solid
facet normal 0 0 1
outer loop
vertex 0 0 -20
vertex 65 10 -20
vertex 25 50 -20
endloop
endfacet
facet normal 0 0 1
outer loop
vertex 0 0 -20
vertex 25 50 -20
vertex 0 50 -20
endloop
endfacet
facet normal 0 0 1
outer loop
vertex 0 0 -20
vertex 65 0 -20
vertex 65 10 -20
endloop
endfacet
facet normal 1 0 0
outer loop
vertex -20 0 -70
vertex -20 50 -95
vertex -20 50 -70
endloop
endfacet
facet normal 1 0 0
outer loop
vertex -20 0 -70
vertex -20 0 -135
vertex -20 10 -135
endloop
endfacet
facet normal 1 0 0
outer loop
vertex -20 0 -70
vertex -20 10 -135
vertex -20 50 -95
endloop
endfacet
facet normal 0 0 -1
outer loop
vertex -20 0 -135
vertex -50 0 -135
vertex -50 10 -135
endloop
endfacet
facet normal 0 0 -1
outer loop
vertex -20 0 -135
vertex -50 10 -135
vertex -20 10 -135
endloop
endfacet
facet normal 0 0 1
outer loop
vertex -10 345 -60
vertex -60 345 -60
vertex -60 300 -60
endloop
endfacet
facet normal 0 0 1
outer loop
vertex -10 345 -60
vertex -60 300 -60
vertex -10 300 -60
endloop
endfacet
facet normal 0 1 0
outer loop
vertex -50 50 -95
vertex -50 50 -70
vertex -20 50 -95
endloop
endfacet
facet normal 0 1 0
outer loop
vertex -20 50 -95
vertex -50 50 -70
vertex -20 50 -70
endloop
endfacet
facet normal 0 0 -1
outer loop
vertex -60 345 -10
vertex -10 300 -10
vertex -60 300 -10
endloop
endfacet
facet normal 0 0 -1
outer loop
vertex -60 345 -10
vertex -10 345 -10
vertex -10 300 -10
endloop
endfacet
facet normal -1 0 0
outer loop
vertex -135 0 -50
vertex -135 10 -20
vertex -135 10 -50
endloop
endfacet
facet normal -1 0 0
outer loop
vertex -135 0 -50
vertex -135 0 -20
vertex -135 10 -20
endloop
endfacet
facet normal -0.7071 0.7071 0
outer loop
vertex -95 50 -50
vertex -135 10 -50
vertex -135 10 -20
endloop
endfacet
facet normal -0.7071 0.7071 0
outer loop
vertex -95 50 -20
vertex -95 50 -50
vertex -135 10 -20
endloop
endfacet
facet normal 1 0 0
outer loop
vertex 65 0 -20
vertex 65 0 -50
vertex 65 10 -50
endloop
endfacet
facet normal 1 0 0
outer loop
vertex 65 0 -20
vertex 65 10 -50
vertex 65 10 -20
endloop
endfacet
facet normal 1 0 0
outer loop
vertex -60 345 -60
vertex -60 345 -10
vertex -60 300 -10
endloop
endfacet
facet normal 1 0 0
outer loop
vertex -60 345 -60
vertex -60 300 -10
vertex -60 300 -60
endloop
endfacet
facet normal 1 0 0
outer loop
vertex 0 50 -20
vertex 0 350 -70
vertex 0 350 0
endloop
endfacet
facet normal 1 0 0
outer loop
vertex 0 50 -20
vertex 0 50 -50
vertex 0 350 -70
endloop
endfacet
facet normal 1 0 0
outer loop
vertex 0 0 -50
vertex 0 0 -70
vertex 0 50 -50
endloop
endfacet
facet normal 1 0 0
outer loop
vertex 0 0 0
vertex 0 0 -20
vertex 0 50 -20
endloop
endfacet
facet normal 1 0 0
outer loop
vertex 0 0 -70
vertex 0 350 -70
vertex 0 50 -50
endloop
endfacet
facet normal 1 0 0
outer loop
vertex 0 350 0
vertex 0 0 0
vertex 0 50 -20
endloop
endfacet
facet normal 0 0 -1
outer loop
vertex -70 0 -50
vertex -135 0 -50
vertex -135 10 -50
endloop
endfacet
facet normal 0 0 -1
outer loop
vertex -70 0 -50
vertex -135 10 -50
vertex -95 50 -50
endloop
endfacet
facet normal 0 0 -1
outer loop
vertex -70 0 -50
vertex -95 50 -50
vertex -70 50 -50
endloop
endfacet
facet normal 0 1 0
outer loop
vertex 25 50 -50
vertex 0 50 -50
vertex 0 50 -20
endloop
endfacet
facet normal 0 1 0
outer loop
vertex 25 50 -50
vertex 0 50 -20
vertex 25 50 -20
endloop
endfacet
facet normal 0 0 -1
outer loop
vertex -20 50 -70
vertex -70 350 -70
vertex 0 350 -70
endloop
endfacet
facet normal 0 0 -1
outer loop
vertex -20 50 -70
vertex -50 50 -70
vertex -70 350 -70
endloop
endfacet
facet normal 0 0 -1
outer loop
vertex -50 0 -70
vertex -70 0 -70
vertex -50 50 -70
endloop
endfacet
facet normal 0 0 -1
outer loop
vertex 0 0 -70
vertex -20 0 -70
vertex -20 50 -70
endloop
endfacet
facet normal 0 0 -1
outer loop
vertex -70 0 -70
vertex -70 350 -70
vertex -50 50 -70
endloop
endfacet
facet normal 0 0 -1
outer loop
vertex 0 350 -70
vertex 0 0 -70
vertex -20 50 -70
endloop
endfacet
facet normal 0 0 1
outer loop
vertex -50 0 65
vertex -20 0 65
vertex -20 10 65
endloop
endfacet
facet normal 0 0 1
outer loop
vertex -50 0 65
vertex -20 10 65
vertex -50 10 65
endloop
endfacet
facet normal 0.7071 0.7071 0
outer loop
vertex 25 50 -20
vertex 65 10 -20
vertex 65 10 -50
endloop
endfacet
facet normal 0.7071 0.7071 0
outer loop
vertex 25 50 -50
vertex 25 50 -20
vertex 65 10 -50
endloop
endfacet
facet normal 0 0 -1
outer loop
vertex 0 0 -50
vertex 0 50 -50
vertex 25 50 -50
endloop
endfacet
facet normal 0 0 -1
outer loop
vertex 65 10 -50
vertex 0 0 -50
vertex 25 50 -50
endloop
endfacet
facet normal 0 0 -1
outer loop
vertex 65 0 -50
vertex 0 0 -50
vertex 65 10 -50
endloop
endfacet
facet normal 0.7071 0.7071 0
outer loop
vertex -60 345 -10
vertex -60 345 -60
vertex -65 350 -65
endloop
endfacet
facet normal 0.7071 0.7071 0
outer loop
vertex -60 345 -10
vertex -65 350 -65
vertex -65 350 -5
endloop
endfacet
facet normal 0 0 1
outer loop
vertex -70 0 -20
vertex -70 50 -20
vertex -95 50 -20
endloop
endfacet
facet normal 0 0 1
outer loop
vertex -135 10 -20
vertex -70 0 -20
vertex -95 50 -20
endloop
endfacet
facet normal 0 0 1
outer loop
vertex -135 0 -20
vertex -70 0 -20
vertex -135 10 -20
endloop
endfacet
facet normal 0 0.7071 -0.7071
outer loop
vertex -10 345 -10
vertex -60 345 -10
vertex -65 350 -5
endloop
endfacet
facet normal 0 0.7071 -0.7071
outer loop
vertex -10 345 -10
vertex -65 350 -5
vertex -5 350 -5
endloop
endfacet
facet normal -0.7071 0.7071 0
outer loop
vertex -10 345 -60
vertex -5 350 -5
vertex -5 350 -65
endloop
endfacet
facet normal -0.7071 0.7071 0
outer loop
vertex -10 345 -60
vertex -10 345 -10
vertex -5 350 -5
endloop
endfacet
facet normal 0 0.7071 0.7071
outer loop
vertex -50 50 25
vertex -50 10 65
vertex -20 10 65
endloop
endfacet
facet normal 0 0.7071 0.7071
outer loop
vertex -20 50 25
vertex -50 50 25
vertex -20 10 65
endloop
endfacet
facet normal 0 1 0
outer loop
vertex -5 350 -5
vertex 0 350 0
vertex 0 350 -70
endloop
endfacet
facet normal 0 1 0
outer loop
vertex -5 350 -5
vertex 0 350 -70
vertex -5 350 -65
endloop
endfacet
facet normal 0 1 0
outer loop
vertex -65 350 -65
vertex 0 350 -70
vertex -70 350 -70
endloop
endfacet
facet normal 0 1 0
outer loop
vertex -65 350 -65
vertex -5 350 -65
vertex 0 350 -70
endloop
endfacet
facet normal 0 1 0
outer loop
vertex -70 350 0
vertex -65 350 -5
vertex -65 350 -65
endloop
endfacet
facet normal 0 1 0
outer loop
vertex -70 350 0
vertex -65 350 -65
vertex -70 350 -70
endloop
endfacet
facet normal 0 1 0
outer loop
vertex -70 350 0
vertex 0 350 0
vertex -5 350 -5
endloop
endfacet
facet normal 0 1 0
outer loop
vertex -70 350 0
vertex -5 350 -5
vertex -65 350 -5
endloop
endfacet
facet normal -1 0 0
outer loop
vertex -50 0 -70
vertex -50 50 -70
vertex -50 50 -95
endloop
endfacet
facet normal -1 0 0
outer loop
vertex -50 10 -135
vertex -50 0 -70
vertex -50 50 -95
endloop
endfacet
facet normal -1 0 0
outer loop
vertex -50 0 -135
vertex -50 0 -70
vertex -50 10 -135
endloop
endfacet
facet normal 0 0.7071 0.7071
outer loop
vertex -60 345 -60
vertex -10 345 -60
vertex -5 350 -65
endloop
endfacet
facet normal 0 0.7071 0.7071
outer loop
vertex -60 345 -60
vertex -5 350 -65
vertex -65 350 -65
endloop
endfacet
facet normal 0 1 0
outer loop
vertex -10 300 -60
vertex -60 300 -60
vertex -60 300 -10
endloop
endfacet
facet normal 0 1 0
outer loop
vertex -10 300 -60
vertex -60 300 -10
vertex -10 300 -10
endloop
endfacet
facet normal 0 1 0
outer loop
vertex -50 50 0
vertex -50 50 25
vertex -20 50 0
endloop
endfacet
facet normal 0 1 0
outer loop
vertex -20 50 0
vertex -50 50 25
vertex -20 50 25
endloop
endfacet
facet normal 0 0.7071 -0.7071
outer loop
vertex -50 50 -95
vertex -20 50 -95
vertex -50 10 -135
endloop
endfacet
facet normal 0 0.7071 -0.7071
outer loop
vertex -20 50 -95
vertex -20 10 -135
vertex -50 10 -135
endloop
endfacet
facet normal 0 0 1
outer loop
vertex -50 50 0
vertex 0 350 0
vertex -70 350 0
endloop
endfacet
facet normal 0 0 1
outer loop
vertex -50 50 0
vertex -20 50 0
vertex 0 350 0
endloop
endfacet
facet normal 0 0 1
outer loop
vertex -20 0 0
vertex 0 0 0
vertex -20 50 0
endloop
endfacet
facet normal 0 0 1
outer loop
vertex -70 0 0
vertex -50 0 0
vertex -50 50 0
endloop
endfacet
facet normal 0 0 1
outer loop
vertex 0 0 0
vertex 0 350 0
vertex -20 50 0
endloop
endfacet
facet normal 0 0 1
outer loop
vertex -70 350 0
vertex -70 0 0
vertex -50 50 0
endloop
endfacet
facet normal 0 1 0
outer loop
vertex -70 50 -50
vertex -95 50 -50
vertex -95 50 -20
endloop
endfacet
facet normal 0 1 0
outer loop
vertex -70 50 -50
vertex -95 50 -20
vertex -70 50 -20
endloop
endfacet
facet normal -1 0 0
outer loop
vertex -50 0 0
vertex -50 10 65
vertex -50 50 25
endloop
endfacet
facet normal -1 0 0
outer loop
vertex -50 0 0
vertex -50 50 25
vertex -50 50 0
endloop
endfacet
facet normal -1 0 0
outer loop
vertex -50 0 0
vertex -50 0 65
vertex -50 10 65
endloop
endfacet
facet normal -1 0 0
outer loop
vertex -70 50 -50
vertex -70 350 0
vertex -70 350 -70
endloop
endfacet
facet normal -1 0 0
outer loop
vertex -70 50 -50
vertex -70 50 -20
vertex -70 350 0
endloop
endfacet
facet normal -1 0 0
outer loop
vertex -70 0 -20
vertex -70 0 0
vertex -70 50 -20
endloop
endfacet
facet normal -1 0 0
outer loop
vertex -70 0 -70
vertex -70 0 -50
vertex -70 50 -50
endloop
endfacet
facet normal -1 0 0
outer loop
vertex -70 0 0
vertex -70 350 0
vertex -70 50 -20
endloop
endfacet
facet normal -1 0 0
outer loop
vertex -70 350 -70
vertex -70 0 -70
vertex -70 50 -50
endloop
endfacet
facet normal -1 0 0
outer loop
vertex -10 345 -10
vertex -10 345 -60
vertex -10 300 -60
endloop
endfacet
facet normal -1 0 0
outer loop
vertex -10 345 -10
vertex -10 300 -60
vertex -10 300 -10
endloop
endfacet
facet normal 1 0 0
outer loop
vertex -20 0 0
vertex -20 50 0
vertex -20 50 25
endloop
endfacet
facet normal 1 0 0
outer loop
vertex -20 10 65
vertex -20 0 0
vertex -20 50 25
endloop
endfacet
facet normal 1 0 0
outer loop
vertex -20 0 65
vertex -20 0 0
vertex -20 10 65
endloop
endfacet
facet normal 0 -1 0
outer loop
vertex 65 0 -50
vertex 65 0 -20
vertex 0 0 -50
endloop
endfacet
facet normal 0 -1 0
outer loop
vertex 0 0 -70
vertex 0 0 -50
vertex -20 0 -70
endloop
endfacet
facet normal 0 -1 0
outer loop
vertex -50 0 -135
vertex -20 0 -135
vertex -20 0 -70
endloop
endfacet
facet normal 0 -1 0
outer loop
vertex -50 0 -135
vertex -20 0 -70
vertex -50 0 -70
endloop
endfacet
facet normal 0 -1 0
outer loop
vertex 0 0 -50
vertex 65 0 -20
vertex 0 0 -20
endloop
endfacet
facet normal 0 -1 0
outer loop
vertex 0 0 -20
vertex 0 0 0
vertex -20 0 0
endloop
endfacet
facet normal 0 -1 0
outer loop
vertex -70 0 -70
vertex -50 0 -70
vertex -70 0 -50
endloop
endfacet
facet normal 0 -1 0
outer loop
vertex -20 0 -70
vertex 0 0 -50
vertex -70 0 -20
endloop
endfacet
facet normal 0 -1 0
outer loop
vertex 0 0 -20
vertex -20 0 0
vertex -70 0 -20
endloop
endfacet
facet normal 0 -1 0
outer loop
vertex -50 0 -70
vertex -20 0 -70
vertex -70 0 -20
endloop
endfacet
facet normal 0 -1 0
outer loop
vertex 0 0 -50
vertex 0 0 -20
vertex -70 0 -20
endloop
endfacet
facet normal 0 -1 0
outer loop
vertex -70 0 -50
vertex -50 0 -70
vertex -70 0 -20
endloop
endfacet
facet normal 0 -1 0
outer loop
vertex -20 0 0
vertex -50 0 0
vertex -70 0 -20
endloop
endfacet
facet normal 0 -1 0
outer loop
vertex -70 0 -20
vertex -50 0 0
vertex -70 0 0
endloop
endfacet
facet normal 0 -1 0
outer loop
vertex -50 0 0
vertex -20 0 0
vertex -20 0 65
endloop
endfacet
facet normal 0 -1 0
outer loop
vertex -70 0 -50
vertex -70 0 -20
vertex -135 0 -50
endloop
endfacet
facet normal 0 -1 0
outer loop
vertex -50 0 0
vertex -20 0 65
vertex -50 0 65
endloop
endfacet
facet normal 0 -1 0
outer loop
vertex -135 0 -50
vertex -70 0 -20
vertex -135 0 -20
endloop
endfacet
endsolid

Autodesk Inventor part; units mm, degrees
ref_plane "YZ Plane" through (0, 0, 0) normal (1, 0, 0) x (0, 1, 0)
ref_plane "XZ Plane" through (0, 0, 0) normal (0, 1, 0) x (-1, 0, 0)
ref_plane "XY Plane" through (0, 0, 0) normal (0, 0, 1) x (1, 0, 0)
sketch "Sketch1" plane through (0, 0, 0) normal (0, 1, 0) x (-1, 0, 0)
  line L0 (0, 0) -> (70, 0)
  line L1 (70, 0) -> (70, -70)
  line L2 (70, -70) -> (0, -70)
  line L3 (0, -70) -> (0, 0)
  dimension "d0" = 70
  dimension "d1" = 70
extrude "Extrusion1" add sketch "Sketch1" along normal blind 350
sketch "Sketch2" plane through (0, 350, 0) normal (0, 1, 0) x (1, 0, 0)
  line L0 (-10, 10) -> (-60, 10)
  line L1 (-60, 10) -> (-60, 60)
  line L2 (-60, 60) -> (-10, 60)
  line L3 (-10, 60) -> (-10, 10)
  line L4 (-70, 0) -> (0, 0) projected
  line L5 (0, 0) -> (0, 70) projected
  dimension "d4" = 50
  dimension "d5" = 50
  dimension "d6" = 10
  dimension "d7" = 10
extrude "Extrusion2" cut sketch "Sketch2" against normal blind 50
chamfer "Chamfer1" distance 5 angle 45 4 edges at (-60, 350, -35) (-35, 350, -60) (-10, 350, -35) (-35, 350, -10)
sketch "Sketch3" plane through (0, 0, 0) normal (0, -1, 0) x (1, 0, 0)
  line L0 (-20, 65) -> (-50, 65)
  line L1 (-50, 65) -> (-50, -135)
  line L2 (-50, -135) -> (-20, -135)
  line L3 (-20, -135) -> (-20, 65)
  line L4 (65, -20) -> (-135, -20)
  line L5 (-135, -20) -> (-135, -50)
  line L6 (-135, -50) -> (65, -50)
  line L7 (65, -50) -> (65, -20)
  line L8 (0, 0) -> (0, -70) projected
  line L9 (0, -70) -> (-70, -70) projected
  line L10 (-70, -70) -> (-70, 0) projected
  point P0 (-50, -50)
  point P1 (-20, -50)
  point P2 (-20, -20)
  point P3 (-50, -20)
  dimension "d14" = 200
  dimension "d15" = 200
  dimension "d16" = 20
  dimension "d17" = 30
  dimension "d18" = 30
  dimension "d19" = 20
  dimension "d20" = 65
  dimension "d21" = 65
extrude "Extrusion3" add sketch "Sketch3" against normal blind 50 contours L3 L4 L1 L0 | L4 L8 L6 L3 | L3 L6 L1 L4 | L1 L6 L10 L4 | L3 L9 L1 L6 | L4 L7 L6 L8 | L10 L6 L5 L4 | L3 L2 L1 L9
chamfer "Chamfer2" distance 40 angle 45 4 edges at (-35, 50, 65) (-135, 50, -35) (-35, 50, -135) (65, 50, -35)
properties part number "FlipperStand"
